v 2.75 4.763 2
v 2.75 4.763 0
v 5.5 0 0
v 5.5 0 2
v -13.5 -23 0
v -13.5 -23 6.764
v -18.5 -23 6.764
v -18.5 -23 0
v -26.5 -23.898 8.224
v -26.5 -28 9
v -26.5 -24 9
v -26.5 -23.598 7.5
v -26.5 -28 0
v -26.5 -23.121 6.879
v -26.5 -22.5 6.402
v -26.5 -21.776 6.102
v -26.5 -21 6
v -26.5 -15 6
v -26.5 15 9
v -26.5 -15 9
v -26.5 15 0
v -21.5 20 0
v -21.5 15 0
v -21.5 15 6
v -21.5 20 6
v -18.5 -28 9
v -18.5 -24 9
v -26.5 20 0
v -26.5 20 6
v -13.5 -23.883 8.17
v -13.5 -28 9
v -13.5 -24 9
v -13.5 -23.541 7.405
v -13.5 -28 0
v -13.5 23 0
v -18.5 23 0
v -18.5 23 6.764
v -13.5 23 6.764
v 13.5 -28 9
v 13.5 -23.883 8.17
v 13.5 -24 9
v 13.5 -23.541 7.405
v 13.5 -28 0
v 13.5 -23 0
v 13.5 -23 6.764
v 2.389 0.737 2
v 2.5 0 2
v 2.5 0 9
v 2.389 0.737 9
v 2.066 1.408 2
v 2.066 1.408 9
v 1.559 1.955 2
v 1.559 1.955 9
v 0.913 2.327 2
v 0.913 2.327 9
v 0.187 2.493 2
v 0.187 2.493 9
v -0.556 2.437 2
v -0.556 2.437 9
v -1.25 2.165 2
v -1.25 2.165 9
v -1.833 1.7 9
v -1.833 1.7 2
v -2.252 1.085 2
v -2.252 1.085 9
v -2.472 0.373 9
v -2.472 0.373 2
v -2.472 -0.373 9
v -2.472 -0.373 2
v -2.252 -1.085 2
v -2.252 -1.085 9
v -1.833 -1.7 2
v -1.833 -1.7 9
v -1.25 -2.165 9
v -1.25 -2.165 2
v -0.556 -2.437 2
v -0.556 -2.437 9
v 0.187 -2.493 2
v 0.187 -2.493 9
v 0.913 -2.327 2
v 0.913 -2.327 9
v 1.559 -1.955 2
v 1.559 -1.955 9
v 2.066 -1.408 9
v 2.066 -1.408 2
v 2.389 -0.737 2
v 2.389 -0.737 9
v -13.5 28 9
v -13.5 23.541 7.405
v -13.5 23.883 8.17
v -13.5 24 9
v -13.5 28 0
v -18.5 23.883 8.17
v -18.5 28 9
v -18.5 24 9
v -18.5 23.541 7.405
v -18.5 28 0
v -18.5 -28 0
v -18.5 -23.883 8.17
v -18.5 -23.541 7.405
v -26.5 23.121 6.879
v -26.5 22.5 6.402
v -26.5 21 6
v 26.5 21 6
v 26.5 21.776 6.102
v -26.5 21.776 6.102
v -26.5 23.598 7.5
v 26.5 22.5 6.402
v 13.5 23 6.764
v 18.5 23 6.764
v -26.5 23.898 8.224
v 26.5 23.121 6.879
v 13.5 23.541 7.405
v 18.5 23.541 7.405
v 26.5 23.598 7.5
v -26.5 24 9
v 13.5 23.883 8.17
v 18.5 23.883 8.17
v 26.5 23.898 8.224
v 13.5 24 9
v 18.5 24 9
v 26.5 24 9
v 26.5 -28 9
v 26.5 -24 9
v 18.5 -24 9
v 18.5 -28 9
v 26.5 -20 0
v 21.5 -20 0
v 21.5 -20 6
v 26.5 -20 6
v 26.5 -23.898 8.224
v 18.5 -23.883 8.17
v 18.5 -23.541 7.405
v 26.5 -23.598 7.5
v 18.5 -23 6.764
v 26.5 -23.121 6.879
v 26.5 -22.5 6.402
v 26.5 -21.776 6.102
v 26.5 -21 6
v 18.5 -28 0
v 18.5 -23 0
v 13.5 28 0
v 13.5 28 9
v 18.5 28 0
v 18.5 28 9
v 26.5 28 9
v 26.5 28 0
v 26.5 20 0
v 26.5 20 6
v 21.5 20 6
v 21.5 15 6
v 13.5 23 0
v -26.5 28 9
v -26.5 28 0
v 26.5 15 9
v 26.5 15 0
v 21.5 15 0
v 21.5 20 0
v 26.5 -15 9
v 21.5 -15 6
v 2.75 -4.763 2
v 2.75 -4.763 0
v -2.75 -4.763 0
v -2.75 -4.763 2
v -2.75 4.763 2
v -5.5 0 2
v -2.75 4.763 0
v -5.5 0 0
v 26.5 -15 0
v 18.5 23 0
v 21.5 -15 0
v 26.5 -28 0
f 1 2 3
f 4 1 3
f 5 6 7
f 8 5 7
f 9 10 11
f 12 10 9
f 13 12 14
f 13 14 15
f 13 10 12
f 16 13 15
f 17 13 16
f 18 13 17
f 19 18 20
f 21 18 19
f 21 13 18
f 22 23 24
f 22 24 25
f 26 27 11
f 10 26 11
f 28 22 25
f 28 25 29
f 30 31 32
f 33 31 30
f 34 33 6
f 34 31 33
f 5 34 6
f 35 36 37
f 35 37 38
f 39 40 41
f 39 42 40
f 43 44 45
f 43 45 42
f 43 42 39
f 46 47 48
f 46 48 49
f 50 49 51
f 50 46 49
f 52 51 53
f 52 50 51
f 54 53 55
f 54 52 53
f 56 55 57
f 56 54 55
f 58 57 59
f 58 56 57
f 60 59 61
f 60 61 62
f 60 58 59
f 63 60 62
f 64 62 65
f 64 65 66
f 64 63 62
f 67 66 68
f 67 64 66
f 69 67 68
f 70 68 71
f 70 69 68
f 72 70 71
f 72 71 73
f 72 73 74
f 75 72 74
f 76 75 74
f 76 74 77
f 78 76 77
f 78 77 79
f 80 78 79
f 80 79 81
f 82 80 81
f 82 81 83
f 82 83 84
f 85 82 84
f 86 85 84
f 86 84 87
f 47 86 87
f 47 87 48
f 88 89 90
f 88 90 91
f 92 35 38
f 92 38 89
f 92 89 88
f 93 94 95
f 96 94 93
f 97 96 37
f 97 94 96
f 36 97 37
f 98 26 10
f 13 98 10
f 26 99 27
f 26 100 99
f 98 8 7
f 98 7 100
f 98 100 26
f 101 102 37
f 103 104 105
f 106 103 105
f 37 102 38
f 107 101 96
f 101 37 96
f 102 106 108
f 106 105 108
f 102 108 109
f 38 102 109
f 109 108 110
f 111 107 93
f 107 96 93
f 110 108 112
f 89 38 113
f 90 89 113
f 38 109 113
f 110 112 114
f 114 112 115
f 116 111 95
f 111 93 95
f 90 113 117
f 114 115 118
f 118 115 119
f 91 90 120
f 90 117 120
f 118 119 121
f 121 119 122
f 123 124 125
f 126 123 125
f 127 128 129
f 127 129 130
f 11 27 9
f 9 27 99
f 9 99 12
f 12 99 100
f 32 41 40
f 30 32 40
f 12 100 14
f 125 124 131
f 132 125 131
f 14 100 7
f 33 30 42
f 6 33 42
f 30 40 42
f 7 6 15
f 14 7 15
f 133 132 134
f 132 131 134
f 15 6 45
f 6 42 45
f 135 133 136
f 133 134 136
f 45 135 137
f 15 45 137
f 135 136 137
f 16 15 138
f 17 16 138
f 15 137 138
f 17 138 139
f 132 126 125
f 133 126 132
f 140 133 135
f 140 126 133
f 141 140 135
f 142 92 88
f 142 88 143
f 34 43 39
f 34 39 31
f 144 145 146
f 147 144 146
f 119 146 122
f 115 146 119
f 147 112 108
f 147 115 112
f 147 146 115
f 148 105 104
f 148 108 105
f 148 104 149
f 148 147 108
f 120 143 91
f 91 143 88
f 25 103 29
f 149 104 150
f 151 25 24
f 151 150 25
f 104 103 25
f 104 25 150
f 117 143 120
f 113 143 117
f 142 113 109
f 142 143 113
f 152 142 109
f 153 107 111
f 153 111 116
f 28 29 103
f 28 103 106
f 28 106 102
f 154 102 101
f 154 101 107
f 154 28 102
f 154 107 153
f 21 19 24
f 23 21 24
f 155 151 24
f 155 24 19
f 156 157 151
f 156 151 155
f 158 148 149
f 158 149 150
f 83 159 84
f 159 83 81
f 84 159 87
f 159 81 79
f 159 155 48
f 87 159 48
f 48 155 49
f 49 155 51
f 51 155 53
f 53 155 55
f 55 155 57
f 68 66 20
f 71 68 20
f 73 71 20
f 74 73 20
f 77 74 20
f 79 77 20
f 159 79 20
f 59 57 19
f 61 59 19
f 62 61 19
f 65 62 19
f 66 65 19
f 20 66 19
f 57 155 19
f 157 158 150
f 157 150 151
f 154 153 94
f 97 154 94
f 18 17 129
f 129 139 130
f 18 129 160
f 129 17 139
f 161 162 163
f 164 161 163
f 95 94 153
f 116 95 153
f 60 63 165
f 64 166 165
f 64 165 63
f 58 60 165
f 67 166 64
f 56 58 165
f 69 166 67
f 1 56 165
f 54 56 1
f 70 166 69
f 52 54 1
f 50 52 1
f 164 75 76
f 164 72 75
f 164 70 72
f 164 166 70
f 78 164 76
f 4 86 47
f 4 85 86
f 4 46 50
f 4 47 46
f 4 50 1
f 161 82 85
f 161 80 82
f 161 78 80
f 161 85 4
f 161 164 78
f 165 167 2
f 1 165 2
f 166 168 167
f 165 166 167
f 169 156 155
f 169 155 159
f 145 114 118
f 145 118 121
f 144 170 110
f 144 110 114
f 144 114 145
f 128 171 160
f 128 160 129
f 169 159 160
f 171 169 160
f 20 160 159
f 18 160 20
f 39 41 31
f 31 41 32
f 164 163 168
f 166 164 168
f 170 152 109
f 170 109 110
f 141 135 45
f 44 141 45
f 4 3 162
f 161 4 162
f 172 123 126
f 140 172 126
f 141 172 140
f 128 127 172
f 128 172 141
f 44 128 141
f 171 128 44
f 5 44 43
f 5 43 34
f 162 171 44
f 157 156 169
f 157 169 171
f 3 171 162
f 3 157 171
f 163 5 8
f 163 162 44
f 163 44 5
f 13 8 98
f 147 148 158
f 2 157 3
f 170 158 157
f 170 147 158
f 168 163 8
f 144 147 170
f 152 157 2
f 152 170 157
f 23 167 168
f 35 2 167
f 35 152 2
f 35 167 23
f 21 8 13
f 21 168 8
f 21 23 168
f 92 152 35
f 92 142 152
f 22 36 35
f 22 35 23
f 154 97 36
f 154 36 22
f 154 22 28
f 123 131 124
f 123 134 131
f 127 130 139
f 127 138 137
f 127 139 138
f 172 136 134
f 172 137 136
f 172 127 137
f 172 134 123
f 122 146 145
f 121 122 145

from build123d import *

# Parameters (mm, degrees)
SKETCH_R        = 2.5
PAD_DEPTH       = 9
POCKET_DEPTH    = 53.001
POCKET001_DEPTH = 2


with BuildPart() as part:
    # Sketch → Pad (new body)
    with BuildSketch(Plane.XY):
        Polygon((-26.5, 28), (-18.5, 28), (-18.5, 23), (-13.5, 23), (-13.5, 28), (13.5, 28), (13.5, 23), (18.5, 23), (18.5, 28), (26.5, 28), (26.5, 20), (21.5, 20), (21.5, 15), (26.5, 15), (26.5, -15), (21.5, -15), (21.5, -20), (26.5, -20), (26.5, -28), (18.5, -28), (18.5, -23), (13.5, -23), (13.5, -28), (-13.5, -28), (-13.5, -23), (-18.5, -23), (-18.5, -28), (-26.5, -28), (-26.5, 15), (-21.5, 15), (-21.5, 20), (-26.5, 20), align=None)
        Circle(SKETCH_R, mode=Mode.SUBTRACT)
    extrude(amount=PAD_DEPTH)

    # Sketch001 (on Face15 of Pad) → Pocket (cut, through all)
    with BuildSketch(Plane.YZ.offset(26.5)):
        with BuildLine():
            ThreePointArc((-24, 9), (-23.12132, 6.87868), (-21, 6))
            Line((-21, 6), (-15, 6))
            Line((-15, 6), (-15, 9))
            Line((-15, 9), (-24, 9))
        make_face()
        with BuildLine():
            ThreePointArc((21, 6), (23.12132, 6.87868), (24, 9))
            Line((15, 9), (24, 9))
            Line((15, 6), (15, 9))
            Line((21, 6), (15, 6))
        make_face()
    extrude(amount=-POCKET_DEPTH, mode=Mode.SUBTRACT)

    # Sketch002 (on Face2 of Pocket) → Pocket001 (cut)
    with BuildSketch(Plane(origin=(0, 0, 0), x_dir=(1, 0, 0), z_dir=(0, 0, -1))):
        Polygon((2.75, -4.76314), (5.5, 0), (2.75, 4.76314), (-2.75, 4.76314), (-5.5, 0), (-2.75, -4.76314), align=None)
    extrude(amount=-POCKET001_DEPTH, mode=Mode.SUBTRACT)


solid = part.part
